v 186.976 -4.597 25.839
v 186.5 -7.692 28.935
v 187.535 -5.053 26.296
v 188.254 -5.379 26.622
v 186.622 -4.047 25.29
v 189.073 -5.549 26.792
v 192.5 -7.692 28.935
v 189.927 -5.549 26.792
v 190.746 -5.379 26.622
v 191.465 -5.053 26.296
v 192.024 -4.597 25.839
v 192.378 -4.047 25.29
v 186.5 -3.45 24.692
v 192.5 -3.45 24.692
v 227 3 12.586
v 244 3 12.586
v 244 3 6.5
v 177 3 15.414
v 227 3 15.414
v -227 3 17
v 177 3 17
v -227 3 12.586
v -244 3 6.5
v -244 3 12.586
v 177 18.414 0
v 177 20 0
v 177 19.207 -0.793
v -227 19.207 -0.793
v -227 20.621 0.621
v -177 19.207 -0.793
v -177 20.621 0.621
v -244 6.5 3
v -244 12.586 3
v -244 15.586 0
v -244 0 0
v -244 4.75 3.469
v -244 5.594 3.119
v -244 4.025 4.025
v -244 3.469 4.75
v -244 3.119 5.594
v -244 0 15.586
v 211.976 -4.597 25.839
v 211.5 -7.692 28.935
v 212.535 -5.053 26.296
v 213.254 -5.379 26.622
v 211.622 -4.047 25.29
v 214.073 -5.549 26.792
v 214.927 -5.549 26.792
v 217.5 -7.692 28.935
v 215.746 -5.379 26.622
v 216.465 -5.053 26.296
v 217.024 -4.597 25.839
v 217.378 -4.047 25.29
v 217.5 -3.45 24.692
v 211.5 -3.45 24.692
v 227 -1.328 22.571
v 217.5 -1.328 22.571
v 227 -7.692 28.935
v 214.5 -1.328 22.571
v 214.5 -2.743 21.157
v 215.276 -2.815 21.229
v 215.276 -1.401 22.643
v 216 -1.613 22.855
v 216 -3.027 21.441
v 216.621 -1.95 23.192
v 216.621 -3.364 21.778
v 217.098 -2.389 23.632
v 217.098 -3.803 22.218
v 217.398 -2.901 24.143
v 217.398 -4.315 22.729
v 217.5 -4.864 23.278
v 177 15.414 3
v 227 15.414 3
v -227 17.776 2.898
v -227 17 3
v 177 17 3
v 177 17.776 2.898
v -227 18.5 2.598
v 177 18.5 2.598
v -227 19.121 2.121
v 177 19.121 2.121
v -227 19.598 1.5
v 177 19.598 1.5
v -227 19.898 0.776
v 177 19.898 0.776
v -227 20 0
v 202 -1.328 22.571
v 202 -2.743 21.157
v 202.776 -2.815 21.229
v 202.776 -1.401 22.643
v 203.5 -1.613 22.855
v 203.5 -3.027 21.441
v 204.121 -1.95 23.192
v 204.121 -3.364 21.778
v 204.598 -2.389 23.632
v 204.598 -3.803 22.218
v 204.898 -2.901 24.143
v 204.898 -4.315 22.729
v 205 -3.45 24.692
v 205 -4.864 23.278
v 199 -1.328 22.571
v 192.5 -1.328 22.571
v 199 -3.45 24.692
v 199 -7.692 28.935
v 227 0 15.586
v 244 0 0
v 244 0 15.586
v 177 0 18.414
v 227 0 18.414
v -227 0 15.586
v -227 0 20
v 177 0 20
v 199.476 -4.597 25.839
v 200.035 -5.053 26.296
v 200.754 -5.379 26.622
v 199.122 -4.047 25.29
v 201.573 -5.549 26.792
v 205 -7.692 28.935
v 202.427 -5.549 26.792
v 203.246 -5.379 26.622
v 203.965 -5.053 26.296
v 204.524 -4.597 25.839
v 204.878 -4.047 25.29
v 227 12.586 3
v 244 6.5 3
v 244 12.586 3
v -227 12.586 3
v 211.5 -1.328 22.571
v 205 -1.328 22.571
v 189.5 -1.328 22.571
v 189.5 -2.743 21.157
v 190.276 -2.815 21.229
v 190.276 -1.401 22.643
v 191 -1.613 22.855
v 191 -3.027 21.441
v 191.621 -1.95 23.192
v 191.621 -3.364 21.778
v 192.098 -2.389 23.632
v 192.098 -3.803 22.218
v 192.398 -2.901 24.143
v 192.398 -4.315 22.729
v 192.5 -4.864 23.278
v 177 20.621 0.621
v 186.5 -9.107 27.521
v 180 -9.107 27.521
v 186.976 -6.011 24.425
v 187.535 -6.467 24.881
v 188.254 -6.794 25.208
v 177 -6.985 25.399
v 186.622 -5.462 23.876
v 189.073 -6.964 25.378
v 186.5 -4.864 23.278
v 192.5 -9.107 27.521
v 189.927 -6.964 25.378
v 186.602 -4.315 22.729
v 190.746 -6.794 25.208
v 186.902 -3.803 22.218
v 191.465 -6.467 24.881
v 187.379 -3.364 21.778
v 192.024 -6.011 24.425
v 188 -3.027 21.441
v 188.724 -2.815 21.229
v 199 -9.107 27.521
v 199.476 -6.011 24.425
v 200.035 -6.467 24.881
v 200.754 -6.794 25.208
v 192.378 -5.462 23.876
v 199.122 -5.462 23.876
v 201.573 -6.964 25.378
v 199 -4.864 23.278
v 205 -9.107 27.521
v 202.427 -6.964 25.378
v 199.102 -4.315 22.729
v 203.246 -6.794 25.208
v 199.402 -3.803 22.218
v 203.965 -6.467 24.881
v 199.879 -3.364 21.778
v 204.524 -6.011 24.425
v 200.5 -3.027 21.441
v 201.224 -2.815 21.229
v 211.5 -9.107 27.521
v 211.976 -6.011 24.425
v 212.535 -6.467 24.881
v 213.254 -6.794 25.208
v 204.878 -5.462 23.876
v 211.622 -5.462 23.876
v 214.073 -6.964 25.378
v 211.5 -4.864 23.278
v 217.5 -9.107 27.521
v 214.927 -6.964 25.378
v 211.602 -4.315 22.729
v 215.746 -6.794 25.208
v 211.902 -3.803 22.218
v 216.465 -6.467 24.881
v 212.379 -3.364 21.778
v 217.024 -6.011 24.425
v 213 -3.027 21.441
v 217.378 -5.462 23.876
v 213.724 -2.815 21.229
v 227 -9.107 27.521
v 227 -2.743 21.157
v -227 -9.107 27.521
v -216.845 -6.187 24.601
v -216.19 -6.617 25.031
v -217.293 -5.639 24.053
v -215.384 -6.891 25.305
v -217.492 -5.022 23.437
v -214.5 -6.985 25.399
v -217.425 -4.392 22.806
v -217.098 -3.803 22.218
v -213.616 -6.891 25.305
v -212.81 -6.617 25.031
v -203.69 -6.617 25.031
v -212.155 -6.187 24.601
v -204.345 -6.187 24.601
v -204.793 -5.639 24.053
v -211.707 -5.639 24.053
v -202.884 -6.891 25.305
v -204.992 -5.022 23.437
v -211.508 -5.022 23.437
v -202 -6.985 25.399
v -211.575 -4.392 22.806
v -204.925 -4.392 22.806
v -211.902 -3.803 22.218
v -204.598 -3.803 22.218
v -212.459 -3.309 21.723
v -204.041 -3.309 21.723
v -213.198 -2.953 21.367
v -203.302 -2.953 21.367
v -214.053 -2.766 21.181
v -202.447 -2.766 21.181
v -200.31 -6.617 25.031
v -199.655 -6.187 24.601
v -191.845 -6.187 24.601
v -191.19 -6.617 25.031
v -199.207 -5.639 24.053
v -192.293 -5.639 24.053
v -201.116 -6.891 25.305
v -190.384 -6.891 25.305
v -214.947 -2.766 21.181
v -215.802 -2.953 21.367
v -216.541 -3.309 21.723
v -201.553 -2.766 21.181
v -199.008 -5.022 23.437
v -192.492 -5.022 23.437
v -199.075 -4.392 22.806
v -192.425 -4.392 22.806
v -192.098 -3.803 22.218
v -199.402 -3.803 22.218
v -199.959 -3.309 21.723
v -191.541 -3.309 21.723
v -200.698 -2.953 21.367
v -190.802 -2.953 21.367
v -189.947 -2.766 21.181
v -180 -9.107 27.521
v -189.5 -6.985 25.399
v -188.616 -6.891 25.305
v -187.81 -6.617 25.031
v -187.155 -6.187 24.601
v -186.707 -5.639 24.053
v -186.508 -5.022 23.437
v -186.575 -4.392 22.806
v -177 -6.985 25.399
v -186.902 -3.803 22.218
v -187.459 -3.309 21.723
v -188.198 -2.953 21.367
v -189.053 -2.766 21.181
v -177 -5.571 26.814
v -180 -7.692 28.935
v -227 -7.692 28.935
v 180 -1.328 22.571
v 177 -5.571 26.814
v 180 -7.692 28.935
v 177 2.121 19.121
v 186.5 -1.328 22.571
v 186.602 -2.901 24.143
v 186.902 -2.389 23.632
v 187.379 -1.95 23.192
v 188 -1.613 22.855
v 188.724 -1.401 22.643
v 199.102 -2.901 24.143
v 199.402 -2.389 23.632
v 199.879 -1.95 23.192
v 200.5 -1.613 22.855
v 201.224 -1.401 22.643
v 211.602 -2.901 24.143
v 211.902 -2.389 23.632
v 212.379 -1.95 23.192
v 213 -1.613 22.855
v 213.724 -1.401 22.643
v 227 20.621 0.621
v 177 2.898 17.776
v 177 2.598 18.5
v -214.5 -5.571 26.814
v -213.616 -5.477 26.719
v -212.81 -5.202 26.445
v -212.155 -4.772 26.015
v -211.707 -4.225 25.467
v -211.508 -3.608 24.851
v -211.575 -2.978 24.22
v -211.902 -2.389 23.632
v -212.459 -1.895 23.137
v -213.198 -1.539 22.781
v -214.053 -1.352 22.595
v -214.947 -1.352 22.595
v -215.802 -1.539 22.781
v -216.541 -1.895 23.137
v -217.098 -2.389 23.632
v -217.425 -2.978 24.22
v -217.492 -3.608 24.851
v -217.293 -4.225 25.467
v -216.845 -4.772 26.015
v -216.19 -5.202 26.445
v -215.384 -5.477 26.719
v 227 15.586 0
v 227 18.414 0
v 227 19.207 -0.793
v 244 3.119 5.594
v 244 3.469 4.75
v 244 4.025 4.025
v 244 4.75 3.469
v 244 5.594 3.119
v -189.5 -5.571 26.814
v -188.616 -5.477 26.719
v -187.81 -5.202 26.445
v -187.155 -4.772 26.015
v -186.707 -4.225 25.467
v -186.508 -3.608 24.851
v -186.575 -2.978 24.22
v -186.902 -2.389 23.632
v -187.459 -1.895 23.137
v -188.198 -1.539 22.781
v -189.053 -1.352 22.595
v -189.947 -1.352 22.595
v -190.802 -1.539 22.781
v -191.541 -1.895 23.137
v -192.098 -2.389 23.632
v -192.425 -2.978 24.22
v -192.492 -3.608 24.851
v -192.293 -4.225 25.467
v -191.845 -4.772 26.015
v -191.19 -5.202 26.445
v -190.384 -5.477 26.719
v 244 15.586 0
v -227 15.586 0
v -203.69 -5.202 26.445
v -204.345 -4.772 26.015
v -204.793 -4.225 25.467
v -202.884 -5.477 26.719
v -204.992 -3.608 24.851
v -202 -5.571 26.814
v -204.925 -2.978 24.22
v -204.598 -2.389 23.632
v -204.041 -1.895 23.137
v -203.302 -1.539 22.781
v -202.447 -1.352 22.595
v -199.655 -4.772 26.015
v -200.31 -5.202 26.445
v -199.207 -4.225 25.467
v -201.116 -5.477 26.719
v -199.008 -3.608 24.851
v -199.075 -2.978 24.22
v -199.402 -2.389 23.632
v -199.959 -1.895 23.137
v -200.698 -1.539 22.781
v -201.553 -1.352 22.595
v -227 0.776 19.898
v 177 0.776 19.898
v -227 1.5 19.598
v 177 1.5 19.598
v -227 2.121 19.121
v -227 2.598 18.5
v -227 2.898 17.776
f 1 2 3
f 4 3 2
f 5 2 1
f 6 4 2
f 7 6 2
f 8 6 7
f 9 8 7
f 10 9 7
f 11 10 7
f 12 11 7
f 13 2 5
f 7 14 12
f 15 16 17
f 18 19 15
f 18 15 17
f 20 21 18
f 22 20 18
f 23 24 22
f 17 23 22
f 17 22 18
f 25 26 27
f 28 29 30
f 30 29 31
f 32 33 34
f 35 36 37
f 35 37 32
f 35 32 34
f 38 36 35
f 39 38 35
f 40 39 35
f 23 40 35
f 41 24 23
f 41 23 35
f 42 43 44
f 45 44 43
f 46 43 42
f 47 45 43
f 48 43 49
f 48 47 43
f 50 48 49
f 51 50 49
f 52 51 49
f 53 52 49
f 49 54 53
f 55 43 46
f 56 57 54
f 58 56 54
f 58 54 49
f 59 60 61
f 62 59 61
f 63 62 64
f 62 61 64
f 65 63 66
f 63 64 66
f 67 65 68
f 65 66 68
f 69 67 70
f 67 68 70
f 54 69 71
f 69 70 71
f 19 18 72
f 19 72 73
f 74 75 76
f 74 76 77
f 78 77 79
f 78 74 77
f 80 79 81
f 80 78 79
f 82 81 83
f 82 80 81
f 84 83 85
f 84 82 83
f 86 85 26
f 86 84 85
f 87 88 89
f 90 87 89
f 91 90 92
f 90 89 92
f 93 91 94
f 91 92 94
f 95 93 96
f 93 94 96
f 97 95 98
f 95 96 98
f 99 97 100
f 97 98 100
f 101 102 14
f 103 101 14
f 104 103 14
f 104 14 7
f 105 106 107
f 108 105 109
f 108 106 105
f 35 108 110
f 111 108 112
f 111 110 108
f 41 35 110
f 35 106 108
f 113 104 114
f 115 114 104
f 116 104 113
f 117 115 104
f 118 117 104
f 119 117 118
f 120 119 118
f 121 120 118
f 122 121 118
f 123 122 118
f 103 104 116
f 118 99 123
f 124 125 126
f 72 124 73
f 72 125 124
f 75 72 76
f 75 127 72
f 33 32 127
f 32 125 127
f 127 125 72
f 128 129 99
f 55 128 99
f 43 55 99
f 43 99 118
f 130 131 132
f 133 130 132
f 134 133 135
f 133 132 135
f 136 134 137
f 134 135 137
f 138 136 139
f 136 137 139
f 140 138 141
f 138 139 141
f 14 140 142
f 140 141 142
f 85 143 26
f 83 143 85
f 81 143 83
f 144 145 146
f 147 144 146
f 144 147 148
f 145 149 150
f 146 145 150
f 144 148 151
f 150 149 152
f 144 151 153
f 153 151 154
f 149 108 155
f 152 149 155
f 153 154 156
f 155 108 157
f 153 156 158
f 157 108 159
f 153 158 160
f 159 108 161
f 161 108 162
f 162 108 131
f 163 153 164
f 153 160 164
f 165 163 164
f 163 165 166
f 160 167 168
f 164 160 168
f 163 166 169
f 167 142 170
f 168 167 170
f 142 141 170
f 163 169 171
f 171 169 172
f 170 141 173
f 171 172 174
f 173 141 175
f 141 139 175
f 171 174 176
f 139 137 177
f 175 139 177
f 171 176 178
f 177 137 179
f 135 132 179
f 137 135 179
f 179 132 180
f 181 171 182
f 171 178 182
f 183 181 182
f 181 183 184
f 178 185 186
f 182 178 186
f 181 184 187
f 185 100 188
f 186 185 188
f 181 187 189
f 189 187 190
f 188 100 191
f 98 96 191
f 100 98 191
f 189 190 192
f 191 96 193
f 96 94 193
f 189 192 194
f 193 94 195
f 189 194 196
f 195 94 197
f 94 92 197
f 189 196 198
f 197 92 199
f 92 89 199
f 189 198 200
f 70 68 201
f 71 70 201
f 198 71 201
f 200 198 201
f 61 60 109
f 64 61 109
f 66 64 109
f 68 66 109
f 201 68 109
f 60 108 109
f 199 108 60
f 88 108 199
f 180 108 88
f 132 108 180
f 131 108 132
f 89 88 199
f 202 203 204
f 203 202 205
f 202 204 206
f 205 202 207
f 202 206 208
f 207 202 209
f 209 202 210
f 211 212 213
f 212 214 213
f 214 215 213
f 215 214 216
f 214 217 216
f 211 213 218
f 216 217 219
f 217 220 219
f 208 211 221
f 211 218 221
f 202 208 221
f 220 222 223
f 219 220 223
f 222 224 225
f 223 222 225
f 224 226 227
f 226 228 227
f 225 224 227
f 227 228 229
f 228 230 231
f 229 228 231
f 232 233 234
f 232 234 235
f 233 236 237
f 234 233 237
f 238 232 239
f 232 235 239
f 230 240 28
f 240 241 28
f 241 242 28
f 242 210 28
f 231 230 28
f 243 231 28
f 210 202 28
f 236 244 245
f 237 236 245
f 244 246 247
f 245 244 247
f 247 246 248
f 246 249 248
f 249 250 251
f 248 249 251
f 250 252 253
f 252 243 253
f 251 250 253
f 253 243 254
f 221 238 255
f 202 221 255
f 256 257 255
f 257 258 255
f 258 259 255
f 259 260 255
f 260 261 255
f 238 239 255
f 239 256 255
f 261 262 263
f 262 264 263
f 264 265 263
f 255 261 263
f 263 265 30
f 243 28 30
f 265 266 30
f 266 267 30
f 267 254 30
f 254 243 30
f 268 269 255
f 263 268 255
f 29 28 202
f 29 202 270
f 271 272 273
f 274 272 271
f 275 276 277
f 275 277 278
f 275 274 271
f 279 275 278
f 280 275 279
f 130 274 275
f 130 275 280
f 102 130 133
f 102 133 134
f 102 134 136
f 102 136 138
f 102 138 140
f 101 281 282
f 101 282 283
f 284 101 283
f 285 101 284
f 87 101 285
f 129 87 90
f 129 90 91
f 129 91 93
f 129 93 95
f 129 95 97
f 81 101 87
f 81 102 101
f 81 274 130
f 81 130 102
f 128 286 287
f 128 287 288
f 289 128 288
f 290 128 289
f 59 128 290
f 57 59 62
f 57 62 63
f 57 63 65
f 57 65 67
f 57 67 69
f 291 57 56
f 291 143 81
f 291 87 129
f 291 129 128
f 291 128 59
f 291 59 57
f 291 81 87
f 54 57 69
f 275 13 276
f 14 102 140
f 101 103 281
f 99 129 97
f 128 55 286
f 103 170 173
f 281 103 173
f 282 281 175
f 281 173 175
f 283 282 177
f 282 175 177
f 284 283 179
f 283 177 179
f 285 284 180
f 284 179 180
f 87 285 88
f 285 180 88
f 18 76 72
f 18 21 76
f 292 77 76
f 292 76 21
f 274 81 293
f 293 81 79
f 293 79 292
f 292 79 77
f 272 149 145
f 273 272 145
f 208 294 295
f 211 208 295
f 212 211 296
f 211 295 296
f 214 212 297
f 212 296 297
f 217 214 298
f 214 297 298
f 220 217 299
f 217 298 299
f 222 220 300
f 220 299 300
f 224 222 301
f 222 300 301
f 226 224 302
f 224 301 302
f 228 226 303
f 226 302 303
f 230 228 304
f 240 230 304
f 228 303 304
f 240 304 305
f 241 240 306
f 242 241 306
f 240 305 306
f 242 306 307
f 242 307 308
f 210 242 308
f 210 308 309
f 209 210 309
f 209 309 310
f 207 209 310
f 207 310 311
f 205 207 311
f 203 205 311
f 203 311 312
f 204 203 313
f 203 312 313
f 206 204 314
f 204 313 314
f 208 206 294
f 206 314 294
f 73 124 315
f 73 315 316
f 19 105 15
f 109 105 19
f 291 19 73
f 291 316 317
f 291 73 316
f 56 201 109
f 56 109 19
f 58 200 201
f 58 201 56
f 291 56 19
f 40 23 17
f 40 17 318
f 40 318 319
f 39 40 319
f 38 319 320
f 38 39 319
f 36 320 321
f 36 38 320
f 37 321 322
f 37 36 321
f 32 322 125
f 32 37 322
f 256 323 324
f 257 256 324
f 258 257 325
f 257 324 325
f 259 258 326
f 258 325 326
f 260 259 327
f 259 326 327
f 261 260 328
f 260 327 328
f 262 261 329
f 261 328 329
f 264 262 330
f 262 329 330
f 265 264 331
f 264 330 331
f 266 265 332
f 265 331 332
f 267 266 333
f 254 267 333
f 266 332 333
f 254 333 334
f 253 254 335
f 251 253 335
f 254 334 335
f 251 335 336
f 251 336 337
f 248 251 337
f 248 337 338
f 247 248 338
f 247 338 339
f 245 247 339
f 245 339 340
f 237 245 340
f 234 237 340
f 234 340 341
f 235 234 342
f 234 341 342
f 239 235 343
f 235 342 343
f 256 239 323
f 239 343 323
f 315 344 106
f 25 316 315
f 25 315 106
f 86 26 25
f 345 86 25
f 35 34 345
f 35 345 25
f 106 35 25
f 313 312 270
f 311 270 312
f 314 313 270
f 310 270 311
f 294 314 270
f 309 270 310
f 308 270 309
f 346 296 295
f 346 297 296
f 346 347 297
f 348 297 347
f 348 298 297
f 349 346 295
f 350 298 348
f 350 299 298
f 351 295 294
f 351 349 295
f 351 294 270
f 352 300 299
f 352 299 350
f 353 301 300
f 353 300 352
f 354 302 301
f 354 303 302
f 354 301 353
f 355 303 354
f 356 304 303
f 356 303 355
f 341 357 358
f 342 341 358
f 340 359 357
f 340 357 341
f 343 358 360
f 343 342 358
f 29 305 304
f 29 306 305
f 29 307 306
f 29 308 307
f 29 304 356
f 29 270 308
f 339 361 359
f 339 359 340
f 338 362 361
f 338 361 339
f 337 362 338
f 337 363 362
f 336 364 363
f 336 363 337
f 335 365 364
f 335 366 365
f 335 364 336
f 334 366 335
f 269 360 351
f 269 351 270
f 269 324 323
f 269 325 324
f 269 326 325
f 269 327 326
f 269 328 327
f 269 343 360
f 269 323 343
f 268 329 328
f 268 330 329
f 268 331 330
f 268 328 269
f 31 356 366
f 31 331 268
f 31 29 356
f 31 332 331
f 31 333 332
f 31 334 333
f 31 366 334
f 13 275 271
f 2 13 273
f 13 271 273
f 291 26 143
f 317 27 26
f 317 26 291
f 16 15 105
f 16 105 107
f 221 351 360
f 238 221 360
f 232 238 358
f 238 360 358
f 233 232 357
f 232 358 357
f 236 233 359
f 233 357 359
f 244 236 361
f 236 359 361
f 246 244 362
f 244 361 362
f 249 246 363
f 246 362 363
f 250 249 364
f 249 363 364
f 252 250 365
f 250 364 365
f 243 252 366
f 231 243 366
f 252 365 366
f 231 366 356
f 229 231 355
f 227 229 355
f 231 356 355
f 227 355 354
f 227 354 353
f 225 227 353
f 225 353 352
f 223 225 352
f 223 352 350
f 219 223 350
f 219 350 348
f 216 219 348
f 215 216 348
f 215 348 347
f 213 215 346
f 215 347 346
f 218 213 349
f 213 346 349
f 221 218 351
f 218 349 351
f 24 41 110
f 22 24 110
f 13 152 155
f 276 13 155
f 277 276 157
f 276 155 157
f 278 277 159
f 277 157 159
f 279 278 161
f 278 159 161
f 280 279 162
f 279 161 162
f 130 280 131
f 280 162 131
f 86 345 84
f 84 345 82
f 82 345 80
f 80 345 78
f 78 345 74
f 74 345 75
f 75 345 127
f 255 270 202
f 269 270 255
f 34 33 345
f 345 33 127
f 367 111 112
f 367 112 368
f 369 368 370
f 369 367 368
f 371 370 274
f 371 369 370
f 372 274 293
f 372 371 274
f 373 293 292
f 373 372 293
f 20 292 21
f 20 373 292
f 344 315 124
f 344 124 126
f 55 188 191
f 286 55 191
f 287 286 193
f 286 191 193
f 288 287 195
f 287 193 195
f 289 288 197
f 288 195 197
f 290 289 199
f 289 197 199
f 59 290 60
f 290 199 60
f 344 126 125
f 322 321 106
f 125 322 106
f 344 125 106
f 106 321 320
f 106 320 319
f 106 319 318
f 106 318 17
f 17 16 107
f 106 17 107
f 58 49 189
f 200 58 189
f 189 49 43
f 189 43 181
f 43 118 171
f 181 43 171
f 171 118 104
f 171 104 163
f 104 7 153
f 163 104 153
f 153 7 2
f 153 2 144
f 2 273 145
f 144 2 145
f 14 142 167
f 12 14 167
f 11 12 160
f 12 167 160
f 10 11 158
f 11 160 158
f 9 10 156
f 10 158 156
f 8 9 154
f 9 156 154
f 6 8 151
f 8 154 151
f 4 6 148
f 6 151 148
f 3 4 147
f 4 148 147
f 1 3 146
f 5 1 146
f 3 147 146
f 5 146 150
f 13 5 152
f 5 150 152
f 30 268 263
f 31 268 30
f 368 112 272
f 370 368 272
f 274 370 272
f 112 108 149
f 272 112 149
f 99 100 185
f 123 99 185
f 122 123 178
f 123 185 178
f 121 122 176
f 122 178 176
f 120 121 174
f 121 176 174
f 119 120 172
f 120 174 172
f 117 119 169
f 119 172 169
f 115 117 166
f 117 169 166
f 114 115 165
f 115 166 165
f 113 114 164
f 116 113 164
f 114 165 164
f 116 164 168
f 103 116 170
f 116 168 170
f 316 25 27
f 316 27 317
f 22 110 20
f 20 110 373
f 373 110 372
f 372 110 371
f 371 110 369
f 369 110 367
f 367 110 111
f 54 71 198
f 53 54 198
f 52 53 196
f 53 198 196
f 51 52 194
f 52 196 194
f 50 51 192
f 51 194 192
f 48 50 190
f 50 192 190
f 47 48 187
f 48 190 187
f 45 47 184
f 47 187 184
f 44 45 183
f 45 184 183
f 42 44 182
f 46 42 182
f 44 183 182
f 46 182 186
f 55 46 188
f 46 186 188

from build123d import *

# Parameters (mm, degrees)
HIERRO_ANGULAR_20_X_20_X_3_1_DEPTH = 488
CROQUIS3_W                         = 67
CROQUIS3_H                         = 40.041630561
CROQUIS3_R                         = 3
SALIENTE_EXTRUIR1_DEPTH            = 2
CHAFL_N1_SIZE                      = 3
CROQUIS4_W                         = 17
CROQUIS4_H                         = 4
CORTAR_EXTRUIR1_DEPTH              = 248.824532079
SIMETR_A3_START                    = -16.899494837
SIMETR_A3_OUTLINE_W                = 50
SIMETR_A3_OUTLINE_H                = 2
SIMETR_A3_DEPTH                    = 31.041630461
SIMETR_A3_START_2                  = 217.5000001
SIMETR_A3_2_DEPTH                  = 9.4999999
SIMETR_A3_START_3                  = 180
SIMETR_A3_3_DEPTH                  = 6.4999999
SIMETR_A3_START_4                  = 192.5000001
SIMETR_A3_4_DEPTH                  = 6.4999998
SIMETR_A3_START_5                  = 205.0000001
SIMETR_A3_5_DEPTH                  = 6.4999998
SIMETR_A3_START_6                  = 11.02081528
SIMETR_A3_6_DEPTH                  = 4
SIMETR_A3_START_7                  = 13.02081528
SIMETR_A3_7_DEPTH                  = 2


with BuildPart() as part:
    # Sketch1 → Hierro angular 20 X 20 X 3(1) (new body)
    with BuildSketch(Plane.YZ.offset(-244)):
        with BuildLine():
            Line((0, 0), (0, 20))
            ThreePointArc((0, 20), (2.121320344, 19.121320344), (3, 17))
            Line((3, 17), (3, 6.5))
            ThreePointArc((3, 6.5), (4.025126266, 4.025126266), (6.5, 3))
            Line((6.5, 3), (17, 3))
            ThreePointArc((17, 3), (19.121320344, 2.121320344), (20, 0))
            Line((20, 0), (0, 0))
        make_face()
    extrude(amount=HIERRO_ANGULAR_20_X_20_X_3_1_DEPTH)


with BuildPart() as body_2:
    # Croquis3 → Saliente-Extruir1 (new body)
    with BuildSketch(Plane(origin=(0, 10.621320344, 10.621320344), x_dir=(1, 0, 0), z_dir=(0, 0.7071067811865477, 0.7071067811865475))):
        with Locations((-210.5, -5.878679656)):
            Rectangle(CROQUIS3_W, CROQUIS3_H)
        with Locations(Location((-189.5, -19.899494937, 0), (0, 0, 270))):
            Circle(CROQUIS3_R, mode=Mode.SUBTRACT)
        with Locations(Location((-202, -19.899494937, 0), (0, 0, 270))):
            Circle(CROQUIS3_R, mode=Mode.SUBTRACT)
        with Locations(Location((-214.5, -19.899494937, 0), (0, 0, 270))):
            Circle(CROQUIS3_R, mode=Mode.SUBTRACT)
    extrude(amount=-SALIENTE_EXTRUIR1_DEPTH)

    # Chaflán1
    chafl_n1_edges = [body_2.edges().sort_by_distance(p)[0] for p in [
        (-177, -8.399494937, 28.227922061),
        (-244, -8.399494937, 28.227922061),
    ]]
    chamfer(chafl_n1_edges, length=CHAFL_N1_SIZE)


with BuildPart() as cortar_extruir1_tool:
    # Croquis4 → Cortar-Extruir1 (new, through all)
    with BuildSketch(Plane(origin=(0, -18.313708499, 18.313708499), x_dir=(1, 0, 0), z_dir=(0, -0.7071067811865476, 0.7071067811865476))):
        with Locations((-235.5, 13.02081528)):
            Rectangle(CROQUIS4_W, CROQUIS4_H)
    extrude(amount=-CORTAR_EXTRUIR1_DEPTH)


with BuildPart() as part_1:
    add(part.part)

    # Cortar-Extruir1: cut by cortar_extruir1_tool
    add(cortar_extruir1_tool.part, mode=Mode.SUBTRACT)

    # Simetría3: read off the stored shape, not the designer's step
    # Simetría3 outline → Simetría3 (add)
    with BuildSketch(Plane(origin=(0, 0, 0), x_dir=(1, 0, 0), z_dir=(0, 0.707106781186547, -0.707106781186548)).offset(SIMETR_A3_START)):
        with Locations((202, -14.02081528)):
            Rectangle(SIMETR_A3_OUTLINE_W, SIMETR_A3_OUTLINE_H)
    extrude(amount=SIMETR_A3_DEPTH)

    # Simetr_a3 2 outline → Simetr_a3 2 (add)
    with BuildSketch(Plane.YZ.offset(SIMETR_A3_START_2)):
        Polygon((-2.742640617, 21.156854179), (-1.328427054, 22.571067741), (-7.692388155, 28.935028843), (-9.106601718, 27.52081528), align=None)
    extrude(amount=SIMETR_A3_2_DEPTH)

    # Simetr_a3 3 outline → Simetr_a3 3 (add)
    with BuildSketch(Plane.YZ.offset(SIMETR_A3_START_3)):
        Polygon((-2.742640617, 21.156854179), (-1.328427054, 22.571067741), (-7.692388155, 28.935028843), (-9.106601718, 27.52081528), align=None)
    extrude(amount=SIMETR_A3_3_DEPTH)

    # Simetr_a3 4 outline → Simetr_a3 4 (add)
    with BuildSketch(Plane.YZ.offset(SIMETR_A3_START_4)):
        Polygon((-2.742640617, 21.156854179), (-1.328427054, 22.571067741), (-7.692388155, 28.935028843), (-9.106601718, 27.52081528), align=None)
    extrude(amount=SIMETR_A3_4_DEPTH)

    # Simetr_a3 5 outline → Simetr_a3 5 (add)
    with BuildSketch(Plane.YZ.offset(SIMETR_A3_START_5)):
        Polygon((-2.742640617, 21.156854179), (-1.328427054, 22.571067741), (-7.692388155, 28.935028843), (-9.106601718, 27.52081528), align=None)
    extrude(amount=SIMETR_A3_5_DEPTH)

    # Simetr_a3 6 outline → Simetr_a3 6 (cut)
    with BuildSketch(Plane(origin=(0, 0, 0), x_dir=(1, 0, 0), z_dir=(0, 0.707106781186548, 0.707106781186547)).offset(SIMETR_A3_START_6)):
        Polygon((244, 16), (227, 16), (227, -25.899494937), (217.5000001, -25.899494937), (217.5000001, -27), (244, -27), align=None)
    extrude(amount=SIMETR_A3_6_DEPTH, mode=Mode.SUBTRACT)

    # Simetr_a3 7 outline → Simetr_a3 7 (add)
    with BuildSketch(Plane(origin=(0, 0, 0), x_dir=(1, 0, 0), z_dir=(0, 0.707106781186548, 0.707106781186547)).offset(SIMETR_A3_START_7)):
        Polygon((180, -16.899494837), (177, -16.899494837), (177, -22.899494937), (180, -25.899494937), align=None)
        with BuildLine():
            Line((186.5, -19.899494937), (186.4999999, -25.899494937))
            Line((186.4999999, -25.899494937), (192.5000001, -25.899494937))
            Line((192.5000001, -25.899494937), (192.5, -19.899494937))
            ThreePointArc((192.5, -19.899494937), (189.5, -22.899494937), (186.5, -19.899494937))
        make_face()
        with BuildLine():
            Line((186.4999999, -16.899494836), (186.5, -19.899494937))
            ThreePointArc((186.5, -19.899494937), (187.378679656, -17.778174593), (189.5, -16.899494937))
            Line((189.5, -16.899494937), (186.4999999, -16.899494836))
        make_face()
        with BuildLine():
            Line((211.4999999, -25.899494937), (217.5000001, -25.899494937))
            Line((217.5000001, -25.899494937), (217.5, -19.899494937))
            ThreePointArc((217.5, -19.899494937), (214.5, -22.899494937), (211.5, -19.899494937))
            Line((211.5, -19.899494937), (211.4999999, -25.899494937))
        make_face()
        with BuildLine():
            Line((199, -19.899494937), (198.9999999, -25.899494937))
            Line((198.9999999, -25.899494937), (205.0000001, -25.899494937))
            Line((205.0000001, -25.899494937), (205, -19.899494937))
            ThreePointArc((205, -19.899494937), (202, -22.899494937), (199, -19.899494937))
        make_face()
        with BuildLine():
            ThreePointArc((189.5, -16.899494937), (191.621320344, -17.778174593), (192.5, -19.899494937))
            Line((192.5, -19.899494937), (192.5000001, -16.899494836))
            Line((192.5000001, -16.899494836), (189.5, -16.899494937))
        make_face()
        with BuildLine():
            ThreePointArc((214.5, -16.899494937), (216.621320344, -17.778174593), (217.5, -19.899494937))
            Line((217.5, -19.899494937), (217.5000001, -16.899494836))
            Line((217.5000001, -16.899494836), (214.5, -16.899494937))
        make_face()
        with BuildLine():
            Line((198.9999999, -16.899494836), (199, -19.899494937))
            ThreePointArc((199, -19.899494937), (199.878679656, -17.778174593), (202, -16.899494937))
            Line((202, -16.899494937), (198.9999999, -16.899494836))
        make_face()
        with BuildLine():
            Line((211.4999999, -16.899494836), (211.5, -19.899494937))
            ThreePointArc((211.5, -19.899494937), (212.378679656, -17.778174593), (214.5, -16.899494937))
            Line((214.5, -16.899494937), (211.4999999, -16.899494836))
        make_face()
        with BuildLine():
            ThreePointArc((202, -16.899494937), (204.121320344, -17.778174593), (205, -19.899494937))
            Line((205, -19.899494937), (205.0000001, -16.899494836))
            Line((205.0000001, -16.899494836), (202, -16.899494937))
        make_face()
    extrude(amount=SIMETR_A3_7_DEPTH)


with BuildPart() as body_2_1:
    add(body_2.part)

    # Cortar-Extruir1: cut by cortar_extruir1_tool
    add(cortar_extruir1_tool.part, mode=Mode.SUBTRACT)


solid = Compound([part_1.part, body_2_1.part])
